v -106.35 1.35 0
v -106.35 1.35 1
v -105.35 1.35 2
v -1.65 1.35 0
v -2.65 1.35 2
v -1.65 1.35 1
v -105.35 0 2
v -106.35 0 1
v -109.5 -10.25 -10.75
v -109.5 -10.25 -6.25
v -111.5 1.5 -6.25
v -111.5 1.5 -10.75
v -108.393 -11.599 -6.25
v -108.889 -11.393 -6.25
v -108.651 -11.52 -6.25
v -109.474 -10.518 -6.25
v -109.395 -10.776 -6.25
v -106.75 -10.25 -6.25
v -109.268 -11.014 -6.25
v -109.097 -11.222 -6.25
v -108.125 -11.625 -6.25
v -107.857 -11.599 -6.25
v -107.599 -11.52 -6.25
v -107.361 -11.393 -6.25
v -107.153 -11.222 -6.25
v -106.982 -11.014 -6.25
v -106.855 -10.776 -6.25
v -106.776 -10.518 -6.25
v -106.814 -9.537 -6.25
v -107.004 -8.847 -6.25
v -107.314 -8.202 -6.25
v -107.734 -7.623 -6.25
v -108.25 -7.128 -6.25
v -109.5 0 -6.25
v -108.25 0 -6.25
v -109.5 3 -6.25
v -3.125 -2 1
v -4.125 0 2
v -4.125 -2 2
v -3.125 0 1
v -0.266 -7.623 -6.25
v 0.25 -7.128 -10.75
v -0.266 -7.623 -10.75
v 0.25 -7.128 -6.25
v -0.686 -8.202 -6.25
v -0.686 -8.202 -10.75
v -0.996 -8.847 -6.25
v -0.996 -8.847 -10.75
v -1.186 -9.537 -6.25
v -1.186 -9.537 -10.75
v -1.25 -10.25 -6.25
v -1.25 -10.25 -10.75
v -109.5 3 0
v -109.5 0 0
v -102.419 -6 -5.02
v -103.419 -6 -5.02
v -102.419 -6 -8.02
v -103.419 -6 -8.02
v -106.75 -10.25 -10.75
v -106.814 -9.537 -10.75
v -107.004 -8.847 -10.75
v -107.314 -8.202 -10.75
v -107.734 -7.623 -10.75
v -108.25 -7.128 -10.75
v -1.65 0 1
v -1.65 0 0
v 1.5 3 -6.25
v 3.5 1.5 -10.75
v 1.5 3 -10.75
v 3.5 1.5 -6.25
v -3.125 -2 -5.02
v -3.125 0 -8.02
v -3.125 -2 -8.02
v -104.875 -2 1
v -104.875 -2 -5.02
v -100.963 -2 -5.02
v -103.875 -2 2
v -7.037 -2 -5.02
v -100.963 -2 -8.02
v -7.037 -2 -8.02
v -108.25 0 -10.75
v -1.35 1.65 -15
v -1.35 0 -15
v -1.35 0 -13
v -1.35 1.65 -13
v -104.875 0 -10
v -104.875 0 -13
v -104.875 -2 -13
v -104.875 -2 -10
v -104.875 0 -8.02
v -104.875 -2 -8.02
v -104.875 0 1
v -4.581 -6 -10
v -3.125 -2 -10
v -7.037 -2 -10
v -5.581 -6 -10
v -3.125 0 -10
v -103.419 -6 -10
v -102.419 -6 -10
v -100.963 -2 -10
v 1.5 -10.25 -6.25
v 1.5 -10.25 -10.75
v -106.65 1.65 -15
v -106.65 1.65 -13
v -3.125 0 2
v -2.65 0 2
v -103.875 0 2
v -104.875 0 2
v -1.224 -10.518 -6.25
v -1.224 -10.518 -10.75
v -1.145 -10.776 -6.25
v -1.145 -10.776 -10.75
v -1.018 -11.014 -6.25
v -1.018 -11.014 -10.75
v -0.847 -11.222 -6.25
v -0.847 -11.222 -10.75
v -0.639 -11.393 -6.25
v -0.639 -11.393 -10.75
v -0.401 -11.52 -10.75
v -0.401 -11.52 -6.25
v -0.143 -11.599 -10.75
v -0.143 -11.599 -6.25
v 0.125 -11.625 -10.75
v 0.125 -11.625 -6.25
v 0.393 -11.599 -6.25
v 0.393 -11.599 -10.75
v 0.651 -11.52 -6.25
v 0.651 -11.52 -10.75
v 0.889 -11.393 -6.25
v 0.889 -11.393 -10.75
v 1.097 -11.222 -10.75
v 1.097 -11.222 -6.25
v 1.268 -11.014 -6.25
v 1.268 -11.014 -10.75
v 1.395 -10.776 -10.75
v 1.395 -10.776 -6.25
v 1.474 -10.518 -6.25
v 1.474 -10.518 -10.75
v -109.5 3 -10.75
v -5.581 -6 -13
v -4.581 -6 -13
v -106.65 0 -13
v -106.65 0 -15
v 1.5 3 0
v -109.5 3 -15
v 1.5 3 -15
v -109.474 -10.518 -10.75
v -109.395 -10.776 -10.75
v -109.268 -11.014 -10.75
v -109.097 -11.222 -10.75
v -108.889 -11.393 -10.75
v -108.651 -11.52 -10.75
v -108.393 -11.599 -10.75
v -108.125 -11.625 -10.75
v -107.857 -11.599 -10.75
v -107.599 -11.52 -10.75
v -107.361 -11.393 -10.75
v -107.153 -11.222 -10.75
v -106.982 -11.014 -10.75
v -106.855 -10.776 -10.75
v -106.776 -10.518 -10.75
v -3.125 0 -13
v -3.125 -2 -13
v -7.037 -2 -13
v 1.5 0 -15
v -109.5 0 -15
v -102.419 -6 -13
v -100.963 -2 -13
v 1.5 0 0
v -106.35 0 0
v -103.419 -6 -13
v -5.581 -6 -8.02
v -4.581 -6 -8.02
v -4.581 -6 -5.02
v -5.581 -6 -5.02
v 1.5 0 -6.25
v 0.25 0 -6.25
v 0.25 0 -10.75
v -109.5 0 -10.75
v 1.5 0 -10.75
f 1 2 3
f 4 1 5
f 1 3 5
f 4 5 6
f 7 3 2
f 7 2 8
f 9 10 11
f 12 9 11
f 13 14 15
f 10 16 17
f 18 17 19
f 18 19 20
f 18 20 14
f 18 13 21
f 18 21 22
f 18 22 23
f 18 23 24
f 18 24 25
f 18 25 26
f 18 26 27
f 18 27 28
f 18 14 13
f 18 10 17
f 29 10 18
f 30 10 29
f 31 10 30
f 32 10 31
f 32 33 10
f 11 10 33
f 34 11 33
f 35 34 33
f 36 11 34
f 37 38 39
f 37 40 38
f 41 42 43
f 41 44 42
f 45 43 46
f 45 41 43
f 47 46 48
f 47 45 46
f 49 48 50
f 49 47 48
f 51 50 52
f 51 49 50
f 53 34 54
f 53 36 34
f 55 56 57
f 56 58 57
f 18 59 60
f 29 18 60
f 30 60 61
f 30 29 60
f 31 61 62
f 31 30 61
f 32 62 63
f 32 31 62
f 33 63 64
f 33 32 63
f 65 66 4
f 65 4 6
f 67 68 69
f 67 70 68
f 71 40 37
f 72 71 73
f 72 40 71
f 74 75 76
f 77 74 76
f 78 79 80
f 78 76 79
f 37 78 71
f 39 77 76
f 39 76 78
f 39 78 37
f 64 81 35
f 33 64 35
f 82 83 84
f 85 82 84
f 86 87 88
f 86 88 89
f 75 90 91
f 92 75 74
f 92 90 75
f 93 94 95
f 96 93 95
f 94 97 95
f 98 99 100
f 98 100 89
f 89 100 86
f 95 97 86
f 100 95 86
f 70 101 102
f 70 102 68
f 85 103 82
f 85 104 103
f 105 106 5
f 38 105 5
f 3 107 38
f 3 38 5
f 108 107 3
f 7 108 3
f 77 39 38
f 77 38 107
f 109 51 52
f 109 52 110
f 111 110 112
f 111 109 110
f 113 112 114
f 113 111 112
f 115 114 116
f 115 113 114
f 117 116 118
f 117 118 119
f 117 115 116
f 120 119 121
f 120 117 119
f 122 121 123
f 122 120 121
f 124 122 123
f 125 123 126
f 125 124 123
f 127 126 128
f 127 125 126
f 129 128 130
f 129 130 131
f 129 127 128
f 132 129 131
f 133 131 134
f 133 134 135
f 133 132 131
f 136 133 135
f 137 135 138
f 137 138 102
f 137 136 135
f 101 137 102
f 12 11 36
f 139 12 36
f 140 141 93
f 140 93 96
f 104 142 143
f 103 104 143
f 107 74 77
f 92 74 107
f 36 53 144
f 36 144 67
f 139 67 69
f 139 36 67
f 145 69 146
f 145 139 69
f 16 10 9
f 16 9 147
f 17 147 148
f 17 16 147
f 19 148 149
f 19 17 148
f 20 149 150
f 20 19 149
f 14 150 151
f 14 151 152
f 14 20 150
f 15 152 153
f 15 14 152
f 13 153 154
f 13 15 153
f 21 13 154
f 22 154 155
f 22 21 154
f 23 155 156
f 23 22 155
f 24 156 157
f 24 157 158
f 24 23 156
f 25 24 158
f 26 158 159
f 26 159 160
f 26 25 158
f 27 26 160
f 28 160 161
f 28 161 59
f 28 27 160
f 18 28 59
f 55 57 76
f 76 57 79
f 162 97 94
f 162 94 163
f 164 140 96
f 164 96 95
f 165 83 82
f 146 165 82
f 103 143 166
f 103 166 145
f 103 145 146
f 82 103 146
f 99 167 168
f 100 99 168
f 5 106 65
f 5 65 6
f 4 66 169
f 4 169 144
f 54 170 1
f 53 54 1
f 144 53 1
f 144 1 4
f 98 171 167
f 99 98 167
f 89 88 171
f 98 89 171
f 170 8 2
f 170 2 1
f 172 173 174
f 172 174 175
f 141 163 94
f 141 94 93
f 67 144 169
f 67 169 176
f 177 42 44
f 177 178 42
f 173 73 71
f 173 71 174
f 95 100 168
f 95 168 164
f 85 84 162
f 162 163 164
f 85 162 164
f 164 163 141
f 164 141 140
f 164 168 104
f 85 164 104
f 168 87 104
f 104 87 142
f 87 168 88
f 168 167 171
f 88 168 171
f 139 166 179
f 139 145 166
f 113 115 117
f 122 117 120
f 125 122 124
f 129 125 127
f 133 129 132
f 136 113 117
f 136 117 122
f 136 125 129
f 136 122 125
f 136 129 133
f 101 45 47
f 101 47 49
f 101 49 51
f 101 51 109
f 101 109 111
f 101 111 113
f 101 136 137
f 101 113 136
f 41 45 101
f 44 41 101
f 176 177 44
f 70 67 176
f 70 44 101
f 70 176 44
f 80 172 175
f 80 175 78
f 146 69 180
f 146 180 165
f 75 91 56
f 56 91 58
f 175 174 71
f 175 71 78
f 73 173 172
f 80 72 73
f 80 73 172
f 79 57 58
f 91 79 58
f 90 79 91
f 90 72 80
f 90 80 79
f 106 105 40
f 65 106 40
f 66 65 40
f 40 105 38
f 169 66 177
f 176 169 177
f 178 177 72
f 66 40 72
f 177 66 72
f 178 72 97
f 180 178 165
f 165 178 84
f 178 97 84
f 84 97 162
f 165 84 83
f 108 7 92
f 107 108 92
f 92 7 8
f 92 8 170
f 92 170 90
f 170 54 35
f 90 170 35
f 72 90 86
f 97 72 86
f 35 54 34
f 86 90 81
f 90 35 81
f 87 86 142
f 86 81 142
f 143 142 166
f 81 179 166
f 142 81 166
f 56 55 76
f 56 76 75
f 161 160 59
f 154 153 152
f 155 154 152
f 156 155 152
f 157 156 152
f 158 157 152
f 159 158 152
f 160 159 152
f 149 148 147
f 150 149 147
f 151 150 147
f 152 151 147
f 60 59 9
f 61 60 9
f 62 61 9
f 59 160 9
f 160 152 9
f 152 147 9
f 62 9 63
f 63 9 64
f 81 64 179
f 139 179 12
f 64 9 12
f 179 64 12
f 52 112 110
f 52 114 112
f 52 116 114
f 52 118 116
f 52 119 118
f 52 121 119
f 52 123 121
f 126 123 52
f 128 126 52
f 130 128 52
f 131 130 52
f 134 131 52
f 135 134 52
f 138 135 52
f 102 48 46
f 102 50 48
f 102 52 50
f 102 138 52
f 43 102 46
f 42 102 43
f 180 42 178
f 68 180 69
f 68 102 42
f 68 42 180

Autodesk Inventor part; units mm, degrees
ref_plane "YZ Plane" through (0, 0, 0) normal (1, 0, 0) x (0, 1, 0)
ref_plane "XZ Plane" through (0, 0, 0) normal (0, 1, 0) x (-1, 0, 0)
ref_plane "XY Plane" through (0, 0, 0) normal (0, 0, 1) x (1, 0, 0)
sketch "Skizze1" plane through (0, 0, 0) normal (0, 1, 0) x (-1, 0, 0)
  line L0 (0, 0) -> (108, 0)
  line L1 (108, 0) -> (108, -15)
  line L2 (108, -15) -> (0, -15)
  line L3 (0, -15) -> (0, 0)
  dimension "d0" = 108
  dimension "d1" = 15
extrude "Extrusion1" add sketch "Skizze1" along normal blind 3
sketch "Skizze2" plane through (0, 0, 0) normal (0, -1, 0) x (1, 0, 0)
  line L0 (-108, 0) -> (0, 0) projected
  line L1 (-106.35, 0) -> (-1.65, 0)
  line L2 (-1.65, 0) -> (-1.65, 2)
  line L3 (-1.65, 2) -> (-106.35, 2)
  line L4 (-106.35, 2) -> (-106.35, 0)
  line L5 (-108, -15) -> (-108, 0) projected
  line L6 (0, -15) -> (-108, -15) projected
  line L7 (-54, -15) -> (-54, 78)
  point P0 (-54, 0)
  point P1 (-54, 2)
  dimension "d4" = 1.65
  dimension "d5" = 2
extrude "Extrusion2" add sketch "Skizze2" against normal blind 1.35 contours L4 L3 L7 L0 | L7 L3 L2 L0
sketch "Skizze3" plane through (0, 0, 0) normal (0, -1, 0) x (1, 0, 0)
  line L0 (0, -15) -> (-108, -15) projected
  line L1 (-106.65, -15) -> (-1.35, -15)
  line L2 (-1.35, -15) -> (-1.35, -13)
  line L3 (-1.35, -13) -> (-106.65, -13)
  line L4 (-106.65, -13) -> (-106.65, -15)
  line L5 (-54, -15) -> (-54, 54)
  line L6 (-108, -15) -> (-108, 0) projected
  point P0 (0, 0)
  dimension "d8" = 1.35
  dimension "d9" = 2
extrude "Extrusion3" cut sketch "Skizze3" against normal blind 1.65
ref_plane "Arbeitsebene1" through (0, 3, -10) normal (0, 0, -1) x (-1, 0, 0)
sketch "Skizze4" plane through (0, 0, 0) normal (0, -1, 0) x (1, 0, 0)
  line L0 (21.6, -10) -> (-129.6, -10) projected
  line L1 (-104.875, -10) -> (-3.125, -10)
  line L2 (-3.125, -10) -> (-3.125, -13)
  line L3 (-3.125, -13) -> (-104.875, -13)
  line L4 (-104.875, -13) -> (-104.875, -10)
  line L5 (-106.65, -13) -> (-1.35, -13) projected
  line L6 (-1.35, -13) -> (-1.35, -15) projected
  line L7 (0, -15) -> (-108, -15) projected
  line L8 (-54, -15) -> (-54, 34)
  point P0 (0, 0)
  point P1 (-3.125, -10)
  dimension "d36" = 101.75
extrude "Extrusion4" add sketch "Skizze4" along normal blind 2 contours L2 L3 L8 L0 | L8 L3 L4 L0
sketch "Skizze5" plane through (0, 0, 0) normal (0, -1, 0) x (1, 0, 0)
  line L0 (-3.125, -8.02) -> (-104.875, -8.02)
  line L1 (-104.875, -8.02) -> (-104.875, 2)
  line L2 (-104.875, 2) -> (-3.125, 2)
  line L3 (-3.125, 2) -> (-3.125, -8.02)
  line L4 (-3.125, -10) -> (-104.875, -10) projected
  line L5 (-104.875, -10) -> (-104.875, -13) projected
  line L6 (-3.125, -13) -> (-3.125, -10) projected
  line L7 (-1.65, 2) -> (-106.35, 2) projected
  point P0 (0, 0)
  dimension "d16" = 1.98
extrude "Extrusion5" add sketch "Skizze5" along normal up to surface (2 mm away)
sketch "Skizze6" plane through (-108, 0, -15) normal (-1, 0, 0) x (0, 0, 1)
  line L0 (15, 3) -> (0, 3) projected
  line L1 (0, 3) -> (15, 3)
  line L2 (15, 3) -> (15, 0)
  line L3 (15, 0) -> (0, 0)
  line L4 (0, 0) -> (0, 3)
extrude "Extrusion6" add sketch "Skizze6" along normal blind 1.5
sketch "Skizze9" plane through (0, 0, 0) normal (1, 0, 0) x (0, 0, -1)
  line L0 (0, 0) -> (15, 0) projected
  line L1 (15, 0) -> (15, 3) projected
  line L2 (0, 3) -> (15, 3) projected
  line L3 (0, 0) -> (0, 3) projected
extrude "Extrusion9" add sketch "Skizze9" along normal blind 1.5
sketch "Skizze7" plane through (-109.5, 0, -15) normal (-1, 0, 0) x (0, 0, 1)
  line L0 (15, 0) -> (0, 0) projected
  line L1 (4, 0) -> (9, 0) construction
  line L2 (9, 0) -> (9, -10) construction
  line L3 (9, -10) -> (4, -10) construction
  line L4 (4, -10) -> (4, 0) construction
  line L5 (0, 3) -> (0, 0) projected
  line L6 (4.25, 0) -> (8.75, 0)
  line L7 (8.75, 0) -> (8.75, -10.25)
  line L8 (8.75, -10.25) -> (4.25, -10.25)
  line L9 (4.25, -10.25) -> (4.25, 0)
  point P0 (9, 0)
  point P1 (8.75, 0)
  point P2 (4.25, 0)
  dimension "d22" = 4
  dimension "d23" = 5
  dimension "d24" = 10
  dimension "d37" = 0.25
  dimension "d38" = 0.25
  dimension "d39" = 0.25
extrude "Extrusion7" add sketch "Skizze7" against normal blind 1.25
extrude "Extrusion11" add sketch "Skizze7" along normal blind 1.25 from surface at -111
sketch "Skizze8" plane through (-109.5, -10, -6.25) normal (0, 0, 1) x (1, 0, 0)
  line L0 (0, 13) -> (111, 13) projected
  line L1 (55.5, 13) -> (55.5, -32)
  line L2 (0, -0.25) -> (0, 10) projected
  line L3 (0, -0.25) -> (1.25, -0.25) projected
  line L4 (1.25, 10) -> (1.25, -0.25) projected
  line L5 (0, 10) -> (1.25, 10) projected
  line L6 (0, -0.25) -> (0, 10) projected
  line L7 (1.25, 10) -> (1.25, -0.25) projected
  line L8 (111, -0.25) -> (111, 10) projected
  arc A0 (2.75, -0.25) -> (1.25, 2.8725) centre (-1.25, -0.25) ccw
  arc A1 (0, -0.25) -> (2.75, -0.25) centre (1.375, -0.25) ccw
  line L9 (0, -0.25) -> (1.25, -0.25)
  line L10 (1.25, 2.8725) -> (0, 2.8725)
  line L11 (0, -0.25) -> (0, 2.8725)
  line L12 (111, -0.25) -> (109.75, -0.25)
  arc A2 (109.75, 2.8725) -> (108.25, -0.25) centre (112.25, -0.25) ccw
  arc A3 (108.25, -0.25) -> (111, -0.25) centre (109.625, -0.25) ccw
  line L13 (111, -0.25) -> (109.75, -0.25)
  line L14 (109.75, 2.8725) -> (111, 2.8725)
  line L15 (111, -0.25) -> (111, 2.8725)
  point P0 (1.25, -4.25)
  point P1 (0, 2.8725)
  dimension "d76" = 4
  dimension "d77" = 1.5
extrude "Extrusion8" add sketch "Skizze8" against normal up to surface (4.5 mm away) contours L2 L10 L4 L3 | L3 L4 A0 A1 | A3 A2 L14 L8
sketch "Skizze11" plane through (0.25, 0, -6.25) normal (0, 0, 1) x (1, 0, 0)
  line L0 (1.25, 3) -> (-109.75, 3) projected
  line L1 (-54.25, 3) -> (-54.25, -19)
  line L2 (-109.75, 3) -> (1.25, 3)
  arc A0 (-1.5, -10.25) -> (1.25, -10.25) centre (-0.125, -10.25) ccw projected
  line L3 (1.25, -10.25) -> (3.25, 1.5)
  line L4 (3.25, 1.5) -> (1.25, 3)
  line L5 (1.25, 3) -> (1.25, 0) projected
  line L6 (1.25, 1.5) -> (5.25, 1.5) construction
  line L7 (1.25, -10.25) -> (1.25, 3) construction
  line L8 (1.25, -10.25) -> (1.25, 0) construction
  line L9 (-109.75, -10.25) -> (-111.75, 1.5)
  line L10 (-111.75, 1.5) -> (-109.75, 3)
  line L11 (-109.75, 3) -> (-109.75, 0)
  line L12 (-109.75, -10.25) -> (-109.75, 3) construction
  line L13 (-109.75, -10.25) -> (-109.75, 0) construction
  line L14 (1.25, -10.25) -> (1.25, 3)
  line L15 (-109.75, 0) -> (-109.75, 3) projected
  line L16 (-109.75, -10.25) -> (-109.75, 3)
  point P0 (-109.75, 1.5)
  point P1 (-109.75, 0)
  point P2 (1.25, 0)
  dimension "d78" = 2
extrude "Extrusion12" add sketch "Skizze11" against normal up to surface (4.5 mm away)
sketch "Skizze12" plane through (-1.35, 1.65, -13) normal (0, 0, -1) x (-1, 0, 0)
  line L0 (1.775, -1.65) -> (1.775, -3.65) projected
  line L1 (1.775, -3.65) -> (3.2309, -7.65)
  line L2 (3.2309, -7.65) -> (4.2309, -7.65)
  line L3 (4.2309, -7.65) -> (5.6868, -3.65)
  line L4 (103.525, -3.65) -> (1.775, -3.65) projected
  line L5 (-1.6, -15.9) -> (-3.35, -15.9) projected
  line L6 (-2.85, 1.35) -> (108.15, 1.35) projected
  line L7 (52.65, 1.35) -> (52.65, -27)
  line L8 (1.775, -3.65) -> (5.6868, -3.65)
  line L9 (103.525, -3.65) -> (102.0691, -7.65)
  line L10 (102.0691, -7.65) -> (101.0691, -7.65)
  line L11 (101.0691, -7.65) -> (99.6132, -3.65)
  line L12 (103.525, -3.65) -> (99.6132, -3.65)
  point P0 (-1.35, -1.65)
  dimension "d52" = 70
  dimension "d53" = 1
  dimension "d55" = 4
extrude "Extrusion13" add sketch "Skizze12" against normal up to surface (3 mm away)
extrude "Extrusion14" add sketch "Skizze12" against normal blind 3 from surface at -4.98
chamfer "Fasen2" distance 1 angle 45 4 edges at (-106.35, 0.675, 2) (-104.875, -1, 2) (-1.65, 0.675, 2) (-3.125, -1, 2)
ref_plane "Arbeitsebene2" through (1.5, 0, 0) normal (1, 0, 0) x (0, 0, -1)
sketch "Skizze13" plane through (1.5, 0, 0) normal (1, 0, 0) x (0, 0, -1)
  point P0 (0, 0)
sketch "Skizze14" plane through (1.5, 0, 0) normal (1, 0, 0) x (0, 0, -1)
  line L0 (-2, -2) -> (-1, -2) projected
  line L1 (-1, -2) -> (-2, -2) projected
  line L2 (5.02, -2) -> (-1, -2) projected
  line L3 (5.02, -2) -> (8.02, -2) projected
  line L4 (8.02, -2) -> (5.02, -2) projected
  line L5 (-1, -2) -> (5.02, -2) projected
  line L6 (10, -6) -> (10, -2) projected
  line L7 (10, -2) -> (10, -6) projected
  line L8 (10, 0) -> (10, -2) projected
  line L9 (10, 0) -> (10, -2) projected
  line L10 (10, -6) -> (10, -2) projected
  line L11 (10, -2) -> (10, -6) projected
  line L12 (0, 3) -> (6.25, 3) projected
  line L13 (6.25, 3) -> (0, 3) projected
  line L14 (10.75, 3) -> (6.25, 3) projected
  line L15 (15, 3) -> (10.75, 3) projected
  line L16 (10.75, 3) -> (15, 3) projected
  line L17 (6.25, 3) -> (10.75, 3) projected
  line L18 (10, -14.25) -> (1, -14.25)
  line L19 (1, -14.25) -> (1, 3)
  line L20 (1, 3) -> (10, 3)
  line L21 (10, 3) -> (10, -14.25)
  line L22 (10, 3) -> (12, 3)
  line L23 (12, 3) -> (12, -1)
  line L24 (12, -1) -> (10, -1)
  line L25 (10, -1) -> (10, 3)
  line L26 (1, 0.35) -> (-1.65, 3)
  line L27 (-1.65, 3) -> (1, 3)
  line L28 (-1, 1.35) -> (-2, 1.35) projected
  line L29 (-1, 1.35) -> (0, 1.35) projected
  line L30 (0, 1.35) -> (-1, 1.35) projected
  line L31 (-2, 1.35) -> (-1, 1.35) projected
  line L32 (0, 1.35) -> (1, 1.35) construction
  line L33 (6.25, -14.25) -> (10.75, -14.25) projected
  line L34 (6.25, -14.25) -> (10.75, -14.25) projected
  line L35 (6.25, -14.25) -> (10.75, -14.25) projected
  point P0 (0, 0)
  dimension "d64" = 9
  dimension "d65" = 2
  dimension "d66" = 4
  dimension "d67" = 45
  dimension "d69" = 1
equation "\"d0\" = Modul_Grundflächenlänge + 2 * Wandstärke"
equation "\"d1\" = Generische_Modulbreite"
equation "\"d2\" = Deckelstärke"
equation "\"d4\" = 0.55 * Basisstärke"
equation "\"d5\" = Modulüberlappung"
equation "\"d6\" = 0.45 * Deckelstärke"
equation "\"d8\" = 0.45 * Basisstärke"
equation "\"d9\" = Modulüberlappung"
equation "\"d10\" = 0.55 * Deckelstärke"
equation "\"d36\" = Modul_Grundflächenlänge - 0.5 * Stecktoleranz"
equation "\"d14\" = Deckel_Verstärkung"
equation "\"d16\" = 1.1 * Platinendicke"
equation "\"d20\" = Deckel_Klipperstärke"
equation "\"d31\" = Deckel_Klipperstärke"
equation "\"d22\" = Deckel_Klipperposition"
equation "\"d23\" = Deckel_Klippbreite"
equation "\"d24\" = Deckel_Klipplänge"
equation "\"d37\" = 0.5 * Stecktoleranz"
equation "\"d38\" = 0.5 * Stecktoleranz"
equation "\"d39\" = 0.5 * Stecktoleranz"
equation "\"d25\" = Deckel_Klipperstärke - 0.5 * Stecktoleranz"
equation "\"d40\" = Deckel_Klipperstärke - 0.5 * Stecktoleranz"
equation "\"d76\" = Deckelklipper_Radius"
equation "\"d77\" = Deckel_Klipptiefe"
equation "\"d55\" = Deckel_Einrastführungslänge"
equation "\"d64\" = Steckverbinder_Lochtiefe"
equation "\"d65\" = Steckverbinder_Absatzbreite"
equation "\"d66\" = Steckverbinder_Absatztiefe"
equation "\"Wandstärke\" = 3"
equation "\"Basisstärke\" = 3"
equation "\"Modulüberlappung\" = 2"
equation "\"Platinendicke\" = 1.8"
equation "\"Deckelstärke\" = 3"
equation "\"Seitenwand_Höhe\" = 39"
equation "\"Platinenposition\" = 5"
equation "\"d12\" = -Platinenposition"
equation "\"Deckel_Klippbreite\" = 5"
equation "\"Deckel_Klipplänge\" = 10"
equation "\"Deckel_Klipperposition\" = 4"
equation "\"Deckel_Klipperstärke\" = 1.5"
equation "\"Deckel_Klipptiefe\" = 1.5"
equation "\"Modul_Klipptiefe\" = 1.5"
equation "\"Modul_Klipperstärke\" = 1.5"
equation "\"Modul_Klipperposition\" = 7"
equation "\"Modul_Klipplänge\" = 8"
equation "\"Lüftungsraster\" = 2"
equation "\"Dings\" = 2"
equation "\"Modul_Grundflächenlänge\" = 102"
equation "\"Relais_Modulbreite\" = 28"
equation "\"Generische_Modulbreite\" = 15"
equation "\"Steckverbinderabsatztiefe\" = 4"
equation "\"Steckverbinder_Absatztiefe\" = 4"
equation "\"Steckverbinder_Absatzbreite\" = 2"
equation "\"Steckverbinder_Lochtiefe\" = 9"
equation "\"Steckverbinder_Fasenbreite\" = 1"
equation "\"Hauptmodul_Klipperabstand\" = 15"
equation "\"Stecktoleranz\" = 0.5"
equation "\"Rahmen_Durchbiegungsstopp\" = 5"
equation "\"Deckel_Einrastführungslänge\" = 4"
equation "\"Deckel_Verstärkung\" = 2"
equation "\"Deckelklipper_Radius\" = 4"
equation "\"Montage_Langloch\" = 5"
equation "\"Montage_Modulbreite\" = 15"
equation "\"Deckklipper_Kantenverrundung\" = 1"
equation "\"Montage_Bohrung\" = 4.5"
equation "\"Hauptmodul_Stufenposition\" = 53"
equation "\"Hauptmodulbreite\" = 28"
equation "\"Hauptmodul_Platinenhöhe_lang\" = 61"
equation "\"Hauptmodul_Platinenhöhe_kurz\" = 48"
equation "\"Generische_Platinenhöhe\" = 38"
equation "\"Modul_Klipperradius\" = 2"
equation "\"Modul_Klipper_Kantenverrundung\" = 1"
equation "\"Test_Schnittabstand\" = 5"
equation "\"Montage_Schwalbenschwanz_Winkel\" = 30deg"
equation "\"Montage_Schwalbenschwanz_Länge\" = 3"
equation "\"Hauptmodul_Deckel_Einschubtiefe\" = 2"
properties part number "Generischer Gehäuse Deckel"
